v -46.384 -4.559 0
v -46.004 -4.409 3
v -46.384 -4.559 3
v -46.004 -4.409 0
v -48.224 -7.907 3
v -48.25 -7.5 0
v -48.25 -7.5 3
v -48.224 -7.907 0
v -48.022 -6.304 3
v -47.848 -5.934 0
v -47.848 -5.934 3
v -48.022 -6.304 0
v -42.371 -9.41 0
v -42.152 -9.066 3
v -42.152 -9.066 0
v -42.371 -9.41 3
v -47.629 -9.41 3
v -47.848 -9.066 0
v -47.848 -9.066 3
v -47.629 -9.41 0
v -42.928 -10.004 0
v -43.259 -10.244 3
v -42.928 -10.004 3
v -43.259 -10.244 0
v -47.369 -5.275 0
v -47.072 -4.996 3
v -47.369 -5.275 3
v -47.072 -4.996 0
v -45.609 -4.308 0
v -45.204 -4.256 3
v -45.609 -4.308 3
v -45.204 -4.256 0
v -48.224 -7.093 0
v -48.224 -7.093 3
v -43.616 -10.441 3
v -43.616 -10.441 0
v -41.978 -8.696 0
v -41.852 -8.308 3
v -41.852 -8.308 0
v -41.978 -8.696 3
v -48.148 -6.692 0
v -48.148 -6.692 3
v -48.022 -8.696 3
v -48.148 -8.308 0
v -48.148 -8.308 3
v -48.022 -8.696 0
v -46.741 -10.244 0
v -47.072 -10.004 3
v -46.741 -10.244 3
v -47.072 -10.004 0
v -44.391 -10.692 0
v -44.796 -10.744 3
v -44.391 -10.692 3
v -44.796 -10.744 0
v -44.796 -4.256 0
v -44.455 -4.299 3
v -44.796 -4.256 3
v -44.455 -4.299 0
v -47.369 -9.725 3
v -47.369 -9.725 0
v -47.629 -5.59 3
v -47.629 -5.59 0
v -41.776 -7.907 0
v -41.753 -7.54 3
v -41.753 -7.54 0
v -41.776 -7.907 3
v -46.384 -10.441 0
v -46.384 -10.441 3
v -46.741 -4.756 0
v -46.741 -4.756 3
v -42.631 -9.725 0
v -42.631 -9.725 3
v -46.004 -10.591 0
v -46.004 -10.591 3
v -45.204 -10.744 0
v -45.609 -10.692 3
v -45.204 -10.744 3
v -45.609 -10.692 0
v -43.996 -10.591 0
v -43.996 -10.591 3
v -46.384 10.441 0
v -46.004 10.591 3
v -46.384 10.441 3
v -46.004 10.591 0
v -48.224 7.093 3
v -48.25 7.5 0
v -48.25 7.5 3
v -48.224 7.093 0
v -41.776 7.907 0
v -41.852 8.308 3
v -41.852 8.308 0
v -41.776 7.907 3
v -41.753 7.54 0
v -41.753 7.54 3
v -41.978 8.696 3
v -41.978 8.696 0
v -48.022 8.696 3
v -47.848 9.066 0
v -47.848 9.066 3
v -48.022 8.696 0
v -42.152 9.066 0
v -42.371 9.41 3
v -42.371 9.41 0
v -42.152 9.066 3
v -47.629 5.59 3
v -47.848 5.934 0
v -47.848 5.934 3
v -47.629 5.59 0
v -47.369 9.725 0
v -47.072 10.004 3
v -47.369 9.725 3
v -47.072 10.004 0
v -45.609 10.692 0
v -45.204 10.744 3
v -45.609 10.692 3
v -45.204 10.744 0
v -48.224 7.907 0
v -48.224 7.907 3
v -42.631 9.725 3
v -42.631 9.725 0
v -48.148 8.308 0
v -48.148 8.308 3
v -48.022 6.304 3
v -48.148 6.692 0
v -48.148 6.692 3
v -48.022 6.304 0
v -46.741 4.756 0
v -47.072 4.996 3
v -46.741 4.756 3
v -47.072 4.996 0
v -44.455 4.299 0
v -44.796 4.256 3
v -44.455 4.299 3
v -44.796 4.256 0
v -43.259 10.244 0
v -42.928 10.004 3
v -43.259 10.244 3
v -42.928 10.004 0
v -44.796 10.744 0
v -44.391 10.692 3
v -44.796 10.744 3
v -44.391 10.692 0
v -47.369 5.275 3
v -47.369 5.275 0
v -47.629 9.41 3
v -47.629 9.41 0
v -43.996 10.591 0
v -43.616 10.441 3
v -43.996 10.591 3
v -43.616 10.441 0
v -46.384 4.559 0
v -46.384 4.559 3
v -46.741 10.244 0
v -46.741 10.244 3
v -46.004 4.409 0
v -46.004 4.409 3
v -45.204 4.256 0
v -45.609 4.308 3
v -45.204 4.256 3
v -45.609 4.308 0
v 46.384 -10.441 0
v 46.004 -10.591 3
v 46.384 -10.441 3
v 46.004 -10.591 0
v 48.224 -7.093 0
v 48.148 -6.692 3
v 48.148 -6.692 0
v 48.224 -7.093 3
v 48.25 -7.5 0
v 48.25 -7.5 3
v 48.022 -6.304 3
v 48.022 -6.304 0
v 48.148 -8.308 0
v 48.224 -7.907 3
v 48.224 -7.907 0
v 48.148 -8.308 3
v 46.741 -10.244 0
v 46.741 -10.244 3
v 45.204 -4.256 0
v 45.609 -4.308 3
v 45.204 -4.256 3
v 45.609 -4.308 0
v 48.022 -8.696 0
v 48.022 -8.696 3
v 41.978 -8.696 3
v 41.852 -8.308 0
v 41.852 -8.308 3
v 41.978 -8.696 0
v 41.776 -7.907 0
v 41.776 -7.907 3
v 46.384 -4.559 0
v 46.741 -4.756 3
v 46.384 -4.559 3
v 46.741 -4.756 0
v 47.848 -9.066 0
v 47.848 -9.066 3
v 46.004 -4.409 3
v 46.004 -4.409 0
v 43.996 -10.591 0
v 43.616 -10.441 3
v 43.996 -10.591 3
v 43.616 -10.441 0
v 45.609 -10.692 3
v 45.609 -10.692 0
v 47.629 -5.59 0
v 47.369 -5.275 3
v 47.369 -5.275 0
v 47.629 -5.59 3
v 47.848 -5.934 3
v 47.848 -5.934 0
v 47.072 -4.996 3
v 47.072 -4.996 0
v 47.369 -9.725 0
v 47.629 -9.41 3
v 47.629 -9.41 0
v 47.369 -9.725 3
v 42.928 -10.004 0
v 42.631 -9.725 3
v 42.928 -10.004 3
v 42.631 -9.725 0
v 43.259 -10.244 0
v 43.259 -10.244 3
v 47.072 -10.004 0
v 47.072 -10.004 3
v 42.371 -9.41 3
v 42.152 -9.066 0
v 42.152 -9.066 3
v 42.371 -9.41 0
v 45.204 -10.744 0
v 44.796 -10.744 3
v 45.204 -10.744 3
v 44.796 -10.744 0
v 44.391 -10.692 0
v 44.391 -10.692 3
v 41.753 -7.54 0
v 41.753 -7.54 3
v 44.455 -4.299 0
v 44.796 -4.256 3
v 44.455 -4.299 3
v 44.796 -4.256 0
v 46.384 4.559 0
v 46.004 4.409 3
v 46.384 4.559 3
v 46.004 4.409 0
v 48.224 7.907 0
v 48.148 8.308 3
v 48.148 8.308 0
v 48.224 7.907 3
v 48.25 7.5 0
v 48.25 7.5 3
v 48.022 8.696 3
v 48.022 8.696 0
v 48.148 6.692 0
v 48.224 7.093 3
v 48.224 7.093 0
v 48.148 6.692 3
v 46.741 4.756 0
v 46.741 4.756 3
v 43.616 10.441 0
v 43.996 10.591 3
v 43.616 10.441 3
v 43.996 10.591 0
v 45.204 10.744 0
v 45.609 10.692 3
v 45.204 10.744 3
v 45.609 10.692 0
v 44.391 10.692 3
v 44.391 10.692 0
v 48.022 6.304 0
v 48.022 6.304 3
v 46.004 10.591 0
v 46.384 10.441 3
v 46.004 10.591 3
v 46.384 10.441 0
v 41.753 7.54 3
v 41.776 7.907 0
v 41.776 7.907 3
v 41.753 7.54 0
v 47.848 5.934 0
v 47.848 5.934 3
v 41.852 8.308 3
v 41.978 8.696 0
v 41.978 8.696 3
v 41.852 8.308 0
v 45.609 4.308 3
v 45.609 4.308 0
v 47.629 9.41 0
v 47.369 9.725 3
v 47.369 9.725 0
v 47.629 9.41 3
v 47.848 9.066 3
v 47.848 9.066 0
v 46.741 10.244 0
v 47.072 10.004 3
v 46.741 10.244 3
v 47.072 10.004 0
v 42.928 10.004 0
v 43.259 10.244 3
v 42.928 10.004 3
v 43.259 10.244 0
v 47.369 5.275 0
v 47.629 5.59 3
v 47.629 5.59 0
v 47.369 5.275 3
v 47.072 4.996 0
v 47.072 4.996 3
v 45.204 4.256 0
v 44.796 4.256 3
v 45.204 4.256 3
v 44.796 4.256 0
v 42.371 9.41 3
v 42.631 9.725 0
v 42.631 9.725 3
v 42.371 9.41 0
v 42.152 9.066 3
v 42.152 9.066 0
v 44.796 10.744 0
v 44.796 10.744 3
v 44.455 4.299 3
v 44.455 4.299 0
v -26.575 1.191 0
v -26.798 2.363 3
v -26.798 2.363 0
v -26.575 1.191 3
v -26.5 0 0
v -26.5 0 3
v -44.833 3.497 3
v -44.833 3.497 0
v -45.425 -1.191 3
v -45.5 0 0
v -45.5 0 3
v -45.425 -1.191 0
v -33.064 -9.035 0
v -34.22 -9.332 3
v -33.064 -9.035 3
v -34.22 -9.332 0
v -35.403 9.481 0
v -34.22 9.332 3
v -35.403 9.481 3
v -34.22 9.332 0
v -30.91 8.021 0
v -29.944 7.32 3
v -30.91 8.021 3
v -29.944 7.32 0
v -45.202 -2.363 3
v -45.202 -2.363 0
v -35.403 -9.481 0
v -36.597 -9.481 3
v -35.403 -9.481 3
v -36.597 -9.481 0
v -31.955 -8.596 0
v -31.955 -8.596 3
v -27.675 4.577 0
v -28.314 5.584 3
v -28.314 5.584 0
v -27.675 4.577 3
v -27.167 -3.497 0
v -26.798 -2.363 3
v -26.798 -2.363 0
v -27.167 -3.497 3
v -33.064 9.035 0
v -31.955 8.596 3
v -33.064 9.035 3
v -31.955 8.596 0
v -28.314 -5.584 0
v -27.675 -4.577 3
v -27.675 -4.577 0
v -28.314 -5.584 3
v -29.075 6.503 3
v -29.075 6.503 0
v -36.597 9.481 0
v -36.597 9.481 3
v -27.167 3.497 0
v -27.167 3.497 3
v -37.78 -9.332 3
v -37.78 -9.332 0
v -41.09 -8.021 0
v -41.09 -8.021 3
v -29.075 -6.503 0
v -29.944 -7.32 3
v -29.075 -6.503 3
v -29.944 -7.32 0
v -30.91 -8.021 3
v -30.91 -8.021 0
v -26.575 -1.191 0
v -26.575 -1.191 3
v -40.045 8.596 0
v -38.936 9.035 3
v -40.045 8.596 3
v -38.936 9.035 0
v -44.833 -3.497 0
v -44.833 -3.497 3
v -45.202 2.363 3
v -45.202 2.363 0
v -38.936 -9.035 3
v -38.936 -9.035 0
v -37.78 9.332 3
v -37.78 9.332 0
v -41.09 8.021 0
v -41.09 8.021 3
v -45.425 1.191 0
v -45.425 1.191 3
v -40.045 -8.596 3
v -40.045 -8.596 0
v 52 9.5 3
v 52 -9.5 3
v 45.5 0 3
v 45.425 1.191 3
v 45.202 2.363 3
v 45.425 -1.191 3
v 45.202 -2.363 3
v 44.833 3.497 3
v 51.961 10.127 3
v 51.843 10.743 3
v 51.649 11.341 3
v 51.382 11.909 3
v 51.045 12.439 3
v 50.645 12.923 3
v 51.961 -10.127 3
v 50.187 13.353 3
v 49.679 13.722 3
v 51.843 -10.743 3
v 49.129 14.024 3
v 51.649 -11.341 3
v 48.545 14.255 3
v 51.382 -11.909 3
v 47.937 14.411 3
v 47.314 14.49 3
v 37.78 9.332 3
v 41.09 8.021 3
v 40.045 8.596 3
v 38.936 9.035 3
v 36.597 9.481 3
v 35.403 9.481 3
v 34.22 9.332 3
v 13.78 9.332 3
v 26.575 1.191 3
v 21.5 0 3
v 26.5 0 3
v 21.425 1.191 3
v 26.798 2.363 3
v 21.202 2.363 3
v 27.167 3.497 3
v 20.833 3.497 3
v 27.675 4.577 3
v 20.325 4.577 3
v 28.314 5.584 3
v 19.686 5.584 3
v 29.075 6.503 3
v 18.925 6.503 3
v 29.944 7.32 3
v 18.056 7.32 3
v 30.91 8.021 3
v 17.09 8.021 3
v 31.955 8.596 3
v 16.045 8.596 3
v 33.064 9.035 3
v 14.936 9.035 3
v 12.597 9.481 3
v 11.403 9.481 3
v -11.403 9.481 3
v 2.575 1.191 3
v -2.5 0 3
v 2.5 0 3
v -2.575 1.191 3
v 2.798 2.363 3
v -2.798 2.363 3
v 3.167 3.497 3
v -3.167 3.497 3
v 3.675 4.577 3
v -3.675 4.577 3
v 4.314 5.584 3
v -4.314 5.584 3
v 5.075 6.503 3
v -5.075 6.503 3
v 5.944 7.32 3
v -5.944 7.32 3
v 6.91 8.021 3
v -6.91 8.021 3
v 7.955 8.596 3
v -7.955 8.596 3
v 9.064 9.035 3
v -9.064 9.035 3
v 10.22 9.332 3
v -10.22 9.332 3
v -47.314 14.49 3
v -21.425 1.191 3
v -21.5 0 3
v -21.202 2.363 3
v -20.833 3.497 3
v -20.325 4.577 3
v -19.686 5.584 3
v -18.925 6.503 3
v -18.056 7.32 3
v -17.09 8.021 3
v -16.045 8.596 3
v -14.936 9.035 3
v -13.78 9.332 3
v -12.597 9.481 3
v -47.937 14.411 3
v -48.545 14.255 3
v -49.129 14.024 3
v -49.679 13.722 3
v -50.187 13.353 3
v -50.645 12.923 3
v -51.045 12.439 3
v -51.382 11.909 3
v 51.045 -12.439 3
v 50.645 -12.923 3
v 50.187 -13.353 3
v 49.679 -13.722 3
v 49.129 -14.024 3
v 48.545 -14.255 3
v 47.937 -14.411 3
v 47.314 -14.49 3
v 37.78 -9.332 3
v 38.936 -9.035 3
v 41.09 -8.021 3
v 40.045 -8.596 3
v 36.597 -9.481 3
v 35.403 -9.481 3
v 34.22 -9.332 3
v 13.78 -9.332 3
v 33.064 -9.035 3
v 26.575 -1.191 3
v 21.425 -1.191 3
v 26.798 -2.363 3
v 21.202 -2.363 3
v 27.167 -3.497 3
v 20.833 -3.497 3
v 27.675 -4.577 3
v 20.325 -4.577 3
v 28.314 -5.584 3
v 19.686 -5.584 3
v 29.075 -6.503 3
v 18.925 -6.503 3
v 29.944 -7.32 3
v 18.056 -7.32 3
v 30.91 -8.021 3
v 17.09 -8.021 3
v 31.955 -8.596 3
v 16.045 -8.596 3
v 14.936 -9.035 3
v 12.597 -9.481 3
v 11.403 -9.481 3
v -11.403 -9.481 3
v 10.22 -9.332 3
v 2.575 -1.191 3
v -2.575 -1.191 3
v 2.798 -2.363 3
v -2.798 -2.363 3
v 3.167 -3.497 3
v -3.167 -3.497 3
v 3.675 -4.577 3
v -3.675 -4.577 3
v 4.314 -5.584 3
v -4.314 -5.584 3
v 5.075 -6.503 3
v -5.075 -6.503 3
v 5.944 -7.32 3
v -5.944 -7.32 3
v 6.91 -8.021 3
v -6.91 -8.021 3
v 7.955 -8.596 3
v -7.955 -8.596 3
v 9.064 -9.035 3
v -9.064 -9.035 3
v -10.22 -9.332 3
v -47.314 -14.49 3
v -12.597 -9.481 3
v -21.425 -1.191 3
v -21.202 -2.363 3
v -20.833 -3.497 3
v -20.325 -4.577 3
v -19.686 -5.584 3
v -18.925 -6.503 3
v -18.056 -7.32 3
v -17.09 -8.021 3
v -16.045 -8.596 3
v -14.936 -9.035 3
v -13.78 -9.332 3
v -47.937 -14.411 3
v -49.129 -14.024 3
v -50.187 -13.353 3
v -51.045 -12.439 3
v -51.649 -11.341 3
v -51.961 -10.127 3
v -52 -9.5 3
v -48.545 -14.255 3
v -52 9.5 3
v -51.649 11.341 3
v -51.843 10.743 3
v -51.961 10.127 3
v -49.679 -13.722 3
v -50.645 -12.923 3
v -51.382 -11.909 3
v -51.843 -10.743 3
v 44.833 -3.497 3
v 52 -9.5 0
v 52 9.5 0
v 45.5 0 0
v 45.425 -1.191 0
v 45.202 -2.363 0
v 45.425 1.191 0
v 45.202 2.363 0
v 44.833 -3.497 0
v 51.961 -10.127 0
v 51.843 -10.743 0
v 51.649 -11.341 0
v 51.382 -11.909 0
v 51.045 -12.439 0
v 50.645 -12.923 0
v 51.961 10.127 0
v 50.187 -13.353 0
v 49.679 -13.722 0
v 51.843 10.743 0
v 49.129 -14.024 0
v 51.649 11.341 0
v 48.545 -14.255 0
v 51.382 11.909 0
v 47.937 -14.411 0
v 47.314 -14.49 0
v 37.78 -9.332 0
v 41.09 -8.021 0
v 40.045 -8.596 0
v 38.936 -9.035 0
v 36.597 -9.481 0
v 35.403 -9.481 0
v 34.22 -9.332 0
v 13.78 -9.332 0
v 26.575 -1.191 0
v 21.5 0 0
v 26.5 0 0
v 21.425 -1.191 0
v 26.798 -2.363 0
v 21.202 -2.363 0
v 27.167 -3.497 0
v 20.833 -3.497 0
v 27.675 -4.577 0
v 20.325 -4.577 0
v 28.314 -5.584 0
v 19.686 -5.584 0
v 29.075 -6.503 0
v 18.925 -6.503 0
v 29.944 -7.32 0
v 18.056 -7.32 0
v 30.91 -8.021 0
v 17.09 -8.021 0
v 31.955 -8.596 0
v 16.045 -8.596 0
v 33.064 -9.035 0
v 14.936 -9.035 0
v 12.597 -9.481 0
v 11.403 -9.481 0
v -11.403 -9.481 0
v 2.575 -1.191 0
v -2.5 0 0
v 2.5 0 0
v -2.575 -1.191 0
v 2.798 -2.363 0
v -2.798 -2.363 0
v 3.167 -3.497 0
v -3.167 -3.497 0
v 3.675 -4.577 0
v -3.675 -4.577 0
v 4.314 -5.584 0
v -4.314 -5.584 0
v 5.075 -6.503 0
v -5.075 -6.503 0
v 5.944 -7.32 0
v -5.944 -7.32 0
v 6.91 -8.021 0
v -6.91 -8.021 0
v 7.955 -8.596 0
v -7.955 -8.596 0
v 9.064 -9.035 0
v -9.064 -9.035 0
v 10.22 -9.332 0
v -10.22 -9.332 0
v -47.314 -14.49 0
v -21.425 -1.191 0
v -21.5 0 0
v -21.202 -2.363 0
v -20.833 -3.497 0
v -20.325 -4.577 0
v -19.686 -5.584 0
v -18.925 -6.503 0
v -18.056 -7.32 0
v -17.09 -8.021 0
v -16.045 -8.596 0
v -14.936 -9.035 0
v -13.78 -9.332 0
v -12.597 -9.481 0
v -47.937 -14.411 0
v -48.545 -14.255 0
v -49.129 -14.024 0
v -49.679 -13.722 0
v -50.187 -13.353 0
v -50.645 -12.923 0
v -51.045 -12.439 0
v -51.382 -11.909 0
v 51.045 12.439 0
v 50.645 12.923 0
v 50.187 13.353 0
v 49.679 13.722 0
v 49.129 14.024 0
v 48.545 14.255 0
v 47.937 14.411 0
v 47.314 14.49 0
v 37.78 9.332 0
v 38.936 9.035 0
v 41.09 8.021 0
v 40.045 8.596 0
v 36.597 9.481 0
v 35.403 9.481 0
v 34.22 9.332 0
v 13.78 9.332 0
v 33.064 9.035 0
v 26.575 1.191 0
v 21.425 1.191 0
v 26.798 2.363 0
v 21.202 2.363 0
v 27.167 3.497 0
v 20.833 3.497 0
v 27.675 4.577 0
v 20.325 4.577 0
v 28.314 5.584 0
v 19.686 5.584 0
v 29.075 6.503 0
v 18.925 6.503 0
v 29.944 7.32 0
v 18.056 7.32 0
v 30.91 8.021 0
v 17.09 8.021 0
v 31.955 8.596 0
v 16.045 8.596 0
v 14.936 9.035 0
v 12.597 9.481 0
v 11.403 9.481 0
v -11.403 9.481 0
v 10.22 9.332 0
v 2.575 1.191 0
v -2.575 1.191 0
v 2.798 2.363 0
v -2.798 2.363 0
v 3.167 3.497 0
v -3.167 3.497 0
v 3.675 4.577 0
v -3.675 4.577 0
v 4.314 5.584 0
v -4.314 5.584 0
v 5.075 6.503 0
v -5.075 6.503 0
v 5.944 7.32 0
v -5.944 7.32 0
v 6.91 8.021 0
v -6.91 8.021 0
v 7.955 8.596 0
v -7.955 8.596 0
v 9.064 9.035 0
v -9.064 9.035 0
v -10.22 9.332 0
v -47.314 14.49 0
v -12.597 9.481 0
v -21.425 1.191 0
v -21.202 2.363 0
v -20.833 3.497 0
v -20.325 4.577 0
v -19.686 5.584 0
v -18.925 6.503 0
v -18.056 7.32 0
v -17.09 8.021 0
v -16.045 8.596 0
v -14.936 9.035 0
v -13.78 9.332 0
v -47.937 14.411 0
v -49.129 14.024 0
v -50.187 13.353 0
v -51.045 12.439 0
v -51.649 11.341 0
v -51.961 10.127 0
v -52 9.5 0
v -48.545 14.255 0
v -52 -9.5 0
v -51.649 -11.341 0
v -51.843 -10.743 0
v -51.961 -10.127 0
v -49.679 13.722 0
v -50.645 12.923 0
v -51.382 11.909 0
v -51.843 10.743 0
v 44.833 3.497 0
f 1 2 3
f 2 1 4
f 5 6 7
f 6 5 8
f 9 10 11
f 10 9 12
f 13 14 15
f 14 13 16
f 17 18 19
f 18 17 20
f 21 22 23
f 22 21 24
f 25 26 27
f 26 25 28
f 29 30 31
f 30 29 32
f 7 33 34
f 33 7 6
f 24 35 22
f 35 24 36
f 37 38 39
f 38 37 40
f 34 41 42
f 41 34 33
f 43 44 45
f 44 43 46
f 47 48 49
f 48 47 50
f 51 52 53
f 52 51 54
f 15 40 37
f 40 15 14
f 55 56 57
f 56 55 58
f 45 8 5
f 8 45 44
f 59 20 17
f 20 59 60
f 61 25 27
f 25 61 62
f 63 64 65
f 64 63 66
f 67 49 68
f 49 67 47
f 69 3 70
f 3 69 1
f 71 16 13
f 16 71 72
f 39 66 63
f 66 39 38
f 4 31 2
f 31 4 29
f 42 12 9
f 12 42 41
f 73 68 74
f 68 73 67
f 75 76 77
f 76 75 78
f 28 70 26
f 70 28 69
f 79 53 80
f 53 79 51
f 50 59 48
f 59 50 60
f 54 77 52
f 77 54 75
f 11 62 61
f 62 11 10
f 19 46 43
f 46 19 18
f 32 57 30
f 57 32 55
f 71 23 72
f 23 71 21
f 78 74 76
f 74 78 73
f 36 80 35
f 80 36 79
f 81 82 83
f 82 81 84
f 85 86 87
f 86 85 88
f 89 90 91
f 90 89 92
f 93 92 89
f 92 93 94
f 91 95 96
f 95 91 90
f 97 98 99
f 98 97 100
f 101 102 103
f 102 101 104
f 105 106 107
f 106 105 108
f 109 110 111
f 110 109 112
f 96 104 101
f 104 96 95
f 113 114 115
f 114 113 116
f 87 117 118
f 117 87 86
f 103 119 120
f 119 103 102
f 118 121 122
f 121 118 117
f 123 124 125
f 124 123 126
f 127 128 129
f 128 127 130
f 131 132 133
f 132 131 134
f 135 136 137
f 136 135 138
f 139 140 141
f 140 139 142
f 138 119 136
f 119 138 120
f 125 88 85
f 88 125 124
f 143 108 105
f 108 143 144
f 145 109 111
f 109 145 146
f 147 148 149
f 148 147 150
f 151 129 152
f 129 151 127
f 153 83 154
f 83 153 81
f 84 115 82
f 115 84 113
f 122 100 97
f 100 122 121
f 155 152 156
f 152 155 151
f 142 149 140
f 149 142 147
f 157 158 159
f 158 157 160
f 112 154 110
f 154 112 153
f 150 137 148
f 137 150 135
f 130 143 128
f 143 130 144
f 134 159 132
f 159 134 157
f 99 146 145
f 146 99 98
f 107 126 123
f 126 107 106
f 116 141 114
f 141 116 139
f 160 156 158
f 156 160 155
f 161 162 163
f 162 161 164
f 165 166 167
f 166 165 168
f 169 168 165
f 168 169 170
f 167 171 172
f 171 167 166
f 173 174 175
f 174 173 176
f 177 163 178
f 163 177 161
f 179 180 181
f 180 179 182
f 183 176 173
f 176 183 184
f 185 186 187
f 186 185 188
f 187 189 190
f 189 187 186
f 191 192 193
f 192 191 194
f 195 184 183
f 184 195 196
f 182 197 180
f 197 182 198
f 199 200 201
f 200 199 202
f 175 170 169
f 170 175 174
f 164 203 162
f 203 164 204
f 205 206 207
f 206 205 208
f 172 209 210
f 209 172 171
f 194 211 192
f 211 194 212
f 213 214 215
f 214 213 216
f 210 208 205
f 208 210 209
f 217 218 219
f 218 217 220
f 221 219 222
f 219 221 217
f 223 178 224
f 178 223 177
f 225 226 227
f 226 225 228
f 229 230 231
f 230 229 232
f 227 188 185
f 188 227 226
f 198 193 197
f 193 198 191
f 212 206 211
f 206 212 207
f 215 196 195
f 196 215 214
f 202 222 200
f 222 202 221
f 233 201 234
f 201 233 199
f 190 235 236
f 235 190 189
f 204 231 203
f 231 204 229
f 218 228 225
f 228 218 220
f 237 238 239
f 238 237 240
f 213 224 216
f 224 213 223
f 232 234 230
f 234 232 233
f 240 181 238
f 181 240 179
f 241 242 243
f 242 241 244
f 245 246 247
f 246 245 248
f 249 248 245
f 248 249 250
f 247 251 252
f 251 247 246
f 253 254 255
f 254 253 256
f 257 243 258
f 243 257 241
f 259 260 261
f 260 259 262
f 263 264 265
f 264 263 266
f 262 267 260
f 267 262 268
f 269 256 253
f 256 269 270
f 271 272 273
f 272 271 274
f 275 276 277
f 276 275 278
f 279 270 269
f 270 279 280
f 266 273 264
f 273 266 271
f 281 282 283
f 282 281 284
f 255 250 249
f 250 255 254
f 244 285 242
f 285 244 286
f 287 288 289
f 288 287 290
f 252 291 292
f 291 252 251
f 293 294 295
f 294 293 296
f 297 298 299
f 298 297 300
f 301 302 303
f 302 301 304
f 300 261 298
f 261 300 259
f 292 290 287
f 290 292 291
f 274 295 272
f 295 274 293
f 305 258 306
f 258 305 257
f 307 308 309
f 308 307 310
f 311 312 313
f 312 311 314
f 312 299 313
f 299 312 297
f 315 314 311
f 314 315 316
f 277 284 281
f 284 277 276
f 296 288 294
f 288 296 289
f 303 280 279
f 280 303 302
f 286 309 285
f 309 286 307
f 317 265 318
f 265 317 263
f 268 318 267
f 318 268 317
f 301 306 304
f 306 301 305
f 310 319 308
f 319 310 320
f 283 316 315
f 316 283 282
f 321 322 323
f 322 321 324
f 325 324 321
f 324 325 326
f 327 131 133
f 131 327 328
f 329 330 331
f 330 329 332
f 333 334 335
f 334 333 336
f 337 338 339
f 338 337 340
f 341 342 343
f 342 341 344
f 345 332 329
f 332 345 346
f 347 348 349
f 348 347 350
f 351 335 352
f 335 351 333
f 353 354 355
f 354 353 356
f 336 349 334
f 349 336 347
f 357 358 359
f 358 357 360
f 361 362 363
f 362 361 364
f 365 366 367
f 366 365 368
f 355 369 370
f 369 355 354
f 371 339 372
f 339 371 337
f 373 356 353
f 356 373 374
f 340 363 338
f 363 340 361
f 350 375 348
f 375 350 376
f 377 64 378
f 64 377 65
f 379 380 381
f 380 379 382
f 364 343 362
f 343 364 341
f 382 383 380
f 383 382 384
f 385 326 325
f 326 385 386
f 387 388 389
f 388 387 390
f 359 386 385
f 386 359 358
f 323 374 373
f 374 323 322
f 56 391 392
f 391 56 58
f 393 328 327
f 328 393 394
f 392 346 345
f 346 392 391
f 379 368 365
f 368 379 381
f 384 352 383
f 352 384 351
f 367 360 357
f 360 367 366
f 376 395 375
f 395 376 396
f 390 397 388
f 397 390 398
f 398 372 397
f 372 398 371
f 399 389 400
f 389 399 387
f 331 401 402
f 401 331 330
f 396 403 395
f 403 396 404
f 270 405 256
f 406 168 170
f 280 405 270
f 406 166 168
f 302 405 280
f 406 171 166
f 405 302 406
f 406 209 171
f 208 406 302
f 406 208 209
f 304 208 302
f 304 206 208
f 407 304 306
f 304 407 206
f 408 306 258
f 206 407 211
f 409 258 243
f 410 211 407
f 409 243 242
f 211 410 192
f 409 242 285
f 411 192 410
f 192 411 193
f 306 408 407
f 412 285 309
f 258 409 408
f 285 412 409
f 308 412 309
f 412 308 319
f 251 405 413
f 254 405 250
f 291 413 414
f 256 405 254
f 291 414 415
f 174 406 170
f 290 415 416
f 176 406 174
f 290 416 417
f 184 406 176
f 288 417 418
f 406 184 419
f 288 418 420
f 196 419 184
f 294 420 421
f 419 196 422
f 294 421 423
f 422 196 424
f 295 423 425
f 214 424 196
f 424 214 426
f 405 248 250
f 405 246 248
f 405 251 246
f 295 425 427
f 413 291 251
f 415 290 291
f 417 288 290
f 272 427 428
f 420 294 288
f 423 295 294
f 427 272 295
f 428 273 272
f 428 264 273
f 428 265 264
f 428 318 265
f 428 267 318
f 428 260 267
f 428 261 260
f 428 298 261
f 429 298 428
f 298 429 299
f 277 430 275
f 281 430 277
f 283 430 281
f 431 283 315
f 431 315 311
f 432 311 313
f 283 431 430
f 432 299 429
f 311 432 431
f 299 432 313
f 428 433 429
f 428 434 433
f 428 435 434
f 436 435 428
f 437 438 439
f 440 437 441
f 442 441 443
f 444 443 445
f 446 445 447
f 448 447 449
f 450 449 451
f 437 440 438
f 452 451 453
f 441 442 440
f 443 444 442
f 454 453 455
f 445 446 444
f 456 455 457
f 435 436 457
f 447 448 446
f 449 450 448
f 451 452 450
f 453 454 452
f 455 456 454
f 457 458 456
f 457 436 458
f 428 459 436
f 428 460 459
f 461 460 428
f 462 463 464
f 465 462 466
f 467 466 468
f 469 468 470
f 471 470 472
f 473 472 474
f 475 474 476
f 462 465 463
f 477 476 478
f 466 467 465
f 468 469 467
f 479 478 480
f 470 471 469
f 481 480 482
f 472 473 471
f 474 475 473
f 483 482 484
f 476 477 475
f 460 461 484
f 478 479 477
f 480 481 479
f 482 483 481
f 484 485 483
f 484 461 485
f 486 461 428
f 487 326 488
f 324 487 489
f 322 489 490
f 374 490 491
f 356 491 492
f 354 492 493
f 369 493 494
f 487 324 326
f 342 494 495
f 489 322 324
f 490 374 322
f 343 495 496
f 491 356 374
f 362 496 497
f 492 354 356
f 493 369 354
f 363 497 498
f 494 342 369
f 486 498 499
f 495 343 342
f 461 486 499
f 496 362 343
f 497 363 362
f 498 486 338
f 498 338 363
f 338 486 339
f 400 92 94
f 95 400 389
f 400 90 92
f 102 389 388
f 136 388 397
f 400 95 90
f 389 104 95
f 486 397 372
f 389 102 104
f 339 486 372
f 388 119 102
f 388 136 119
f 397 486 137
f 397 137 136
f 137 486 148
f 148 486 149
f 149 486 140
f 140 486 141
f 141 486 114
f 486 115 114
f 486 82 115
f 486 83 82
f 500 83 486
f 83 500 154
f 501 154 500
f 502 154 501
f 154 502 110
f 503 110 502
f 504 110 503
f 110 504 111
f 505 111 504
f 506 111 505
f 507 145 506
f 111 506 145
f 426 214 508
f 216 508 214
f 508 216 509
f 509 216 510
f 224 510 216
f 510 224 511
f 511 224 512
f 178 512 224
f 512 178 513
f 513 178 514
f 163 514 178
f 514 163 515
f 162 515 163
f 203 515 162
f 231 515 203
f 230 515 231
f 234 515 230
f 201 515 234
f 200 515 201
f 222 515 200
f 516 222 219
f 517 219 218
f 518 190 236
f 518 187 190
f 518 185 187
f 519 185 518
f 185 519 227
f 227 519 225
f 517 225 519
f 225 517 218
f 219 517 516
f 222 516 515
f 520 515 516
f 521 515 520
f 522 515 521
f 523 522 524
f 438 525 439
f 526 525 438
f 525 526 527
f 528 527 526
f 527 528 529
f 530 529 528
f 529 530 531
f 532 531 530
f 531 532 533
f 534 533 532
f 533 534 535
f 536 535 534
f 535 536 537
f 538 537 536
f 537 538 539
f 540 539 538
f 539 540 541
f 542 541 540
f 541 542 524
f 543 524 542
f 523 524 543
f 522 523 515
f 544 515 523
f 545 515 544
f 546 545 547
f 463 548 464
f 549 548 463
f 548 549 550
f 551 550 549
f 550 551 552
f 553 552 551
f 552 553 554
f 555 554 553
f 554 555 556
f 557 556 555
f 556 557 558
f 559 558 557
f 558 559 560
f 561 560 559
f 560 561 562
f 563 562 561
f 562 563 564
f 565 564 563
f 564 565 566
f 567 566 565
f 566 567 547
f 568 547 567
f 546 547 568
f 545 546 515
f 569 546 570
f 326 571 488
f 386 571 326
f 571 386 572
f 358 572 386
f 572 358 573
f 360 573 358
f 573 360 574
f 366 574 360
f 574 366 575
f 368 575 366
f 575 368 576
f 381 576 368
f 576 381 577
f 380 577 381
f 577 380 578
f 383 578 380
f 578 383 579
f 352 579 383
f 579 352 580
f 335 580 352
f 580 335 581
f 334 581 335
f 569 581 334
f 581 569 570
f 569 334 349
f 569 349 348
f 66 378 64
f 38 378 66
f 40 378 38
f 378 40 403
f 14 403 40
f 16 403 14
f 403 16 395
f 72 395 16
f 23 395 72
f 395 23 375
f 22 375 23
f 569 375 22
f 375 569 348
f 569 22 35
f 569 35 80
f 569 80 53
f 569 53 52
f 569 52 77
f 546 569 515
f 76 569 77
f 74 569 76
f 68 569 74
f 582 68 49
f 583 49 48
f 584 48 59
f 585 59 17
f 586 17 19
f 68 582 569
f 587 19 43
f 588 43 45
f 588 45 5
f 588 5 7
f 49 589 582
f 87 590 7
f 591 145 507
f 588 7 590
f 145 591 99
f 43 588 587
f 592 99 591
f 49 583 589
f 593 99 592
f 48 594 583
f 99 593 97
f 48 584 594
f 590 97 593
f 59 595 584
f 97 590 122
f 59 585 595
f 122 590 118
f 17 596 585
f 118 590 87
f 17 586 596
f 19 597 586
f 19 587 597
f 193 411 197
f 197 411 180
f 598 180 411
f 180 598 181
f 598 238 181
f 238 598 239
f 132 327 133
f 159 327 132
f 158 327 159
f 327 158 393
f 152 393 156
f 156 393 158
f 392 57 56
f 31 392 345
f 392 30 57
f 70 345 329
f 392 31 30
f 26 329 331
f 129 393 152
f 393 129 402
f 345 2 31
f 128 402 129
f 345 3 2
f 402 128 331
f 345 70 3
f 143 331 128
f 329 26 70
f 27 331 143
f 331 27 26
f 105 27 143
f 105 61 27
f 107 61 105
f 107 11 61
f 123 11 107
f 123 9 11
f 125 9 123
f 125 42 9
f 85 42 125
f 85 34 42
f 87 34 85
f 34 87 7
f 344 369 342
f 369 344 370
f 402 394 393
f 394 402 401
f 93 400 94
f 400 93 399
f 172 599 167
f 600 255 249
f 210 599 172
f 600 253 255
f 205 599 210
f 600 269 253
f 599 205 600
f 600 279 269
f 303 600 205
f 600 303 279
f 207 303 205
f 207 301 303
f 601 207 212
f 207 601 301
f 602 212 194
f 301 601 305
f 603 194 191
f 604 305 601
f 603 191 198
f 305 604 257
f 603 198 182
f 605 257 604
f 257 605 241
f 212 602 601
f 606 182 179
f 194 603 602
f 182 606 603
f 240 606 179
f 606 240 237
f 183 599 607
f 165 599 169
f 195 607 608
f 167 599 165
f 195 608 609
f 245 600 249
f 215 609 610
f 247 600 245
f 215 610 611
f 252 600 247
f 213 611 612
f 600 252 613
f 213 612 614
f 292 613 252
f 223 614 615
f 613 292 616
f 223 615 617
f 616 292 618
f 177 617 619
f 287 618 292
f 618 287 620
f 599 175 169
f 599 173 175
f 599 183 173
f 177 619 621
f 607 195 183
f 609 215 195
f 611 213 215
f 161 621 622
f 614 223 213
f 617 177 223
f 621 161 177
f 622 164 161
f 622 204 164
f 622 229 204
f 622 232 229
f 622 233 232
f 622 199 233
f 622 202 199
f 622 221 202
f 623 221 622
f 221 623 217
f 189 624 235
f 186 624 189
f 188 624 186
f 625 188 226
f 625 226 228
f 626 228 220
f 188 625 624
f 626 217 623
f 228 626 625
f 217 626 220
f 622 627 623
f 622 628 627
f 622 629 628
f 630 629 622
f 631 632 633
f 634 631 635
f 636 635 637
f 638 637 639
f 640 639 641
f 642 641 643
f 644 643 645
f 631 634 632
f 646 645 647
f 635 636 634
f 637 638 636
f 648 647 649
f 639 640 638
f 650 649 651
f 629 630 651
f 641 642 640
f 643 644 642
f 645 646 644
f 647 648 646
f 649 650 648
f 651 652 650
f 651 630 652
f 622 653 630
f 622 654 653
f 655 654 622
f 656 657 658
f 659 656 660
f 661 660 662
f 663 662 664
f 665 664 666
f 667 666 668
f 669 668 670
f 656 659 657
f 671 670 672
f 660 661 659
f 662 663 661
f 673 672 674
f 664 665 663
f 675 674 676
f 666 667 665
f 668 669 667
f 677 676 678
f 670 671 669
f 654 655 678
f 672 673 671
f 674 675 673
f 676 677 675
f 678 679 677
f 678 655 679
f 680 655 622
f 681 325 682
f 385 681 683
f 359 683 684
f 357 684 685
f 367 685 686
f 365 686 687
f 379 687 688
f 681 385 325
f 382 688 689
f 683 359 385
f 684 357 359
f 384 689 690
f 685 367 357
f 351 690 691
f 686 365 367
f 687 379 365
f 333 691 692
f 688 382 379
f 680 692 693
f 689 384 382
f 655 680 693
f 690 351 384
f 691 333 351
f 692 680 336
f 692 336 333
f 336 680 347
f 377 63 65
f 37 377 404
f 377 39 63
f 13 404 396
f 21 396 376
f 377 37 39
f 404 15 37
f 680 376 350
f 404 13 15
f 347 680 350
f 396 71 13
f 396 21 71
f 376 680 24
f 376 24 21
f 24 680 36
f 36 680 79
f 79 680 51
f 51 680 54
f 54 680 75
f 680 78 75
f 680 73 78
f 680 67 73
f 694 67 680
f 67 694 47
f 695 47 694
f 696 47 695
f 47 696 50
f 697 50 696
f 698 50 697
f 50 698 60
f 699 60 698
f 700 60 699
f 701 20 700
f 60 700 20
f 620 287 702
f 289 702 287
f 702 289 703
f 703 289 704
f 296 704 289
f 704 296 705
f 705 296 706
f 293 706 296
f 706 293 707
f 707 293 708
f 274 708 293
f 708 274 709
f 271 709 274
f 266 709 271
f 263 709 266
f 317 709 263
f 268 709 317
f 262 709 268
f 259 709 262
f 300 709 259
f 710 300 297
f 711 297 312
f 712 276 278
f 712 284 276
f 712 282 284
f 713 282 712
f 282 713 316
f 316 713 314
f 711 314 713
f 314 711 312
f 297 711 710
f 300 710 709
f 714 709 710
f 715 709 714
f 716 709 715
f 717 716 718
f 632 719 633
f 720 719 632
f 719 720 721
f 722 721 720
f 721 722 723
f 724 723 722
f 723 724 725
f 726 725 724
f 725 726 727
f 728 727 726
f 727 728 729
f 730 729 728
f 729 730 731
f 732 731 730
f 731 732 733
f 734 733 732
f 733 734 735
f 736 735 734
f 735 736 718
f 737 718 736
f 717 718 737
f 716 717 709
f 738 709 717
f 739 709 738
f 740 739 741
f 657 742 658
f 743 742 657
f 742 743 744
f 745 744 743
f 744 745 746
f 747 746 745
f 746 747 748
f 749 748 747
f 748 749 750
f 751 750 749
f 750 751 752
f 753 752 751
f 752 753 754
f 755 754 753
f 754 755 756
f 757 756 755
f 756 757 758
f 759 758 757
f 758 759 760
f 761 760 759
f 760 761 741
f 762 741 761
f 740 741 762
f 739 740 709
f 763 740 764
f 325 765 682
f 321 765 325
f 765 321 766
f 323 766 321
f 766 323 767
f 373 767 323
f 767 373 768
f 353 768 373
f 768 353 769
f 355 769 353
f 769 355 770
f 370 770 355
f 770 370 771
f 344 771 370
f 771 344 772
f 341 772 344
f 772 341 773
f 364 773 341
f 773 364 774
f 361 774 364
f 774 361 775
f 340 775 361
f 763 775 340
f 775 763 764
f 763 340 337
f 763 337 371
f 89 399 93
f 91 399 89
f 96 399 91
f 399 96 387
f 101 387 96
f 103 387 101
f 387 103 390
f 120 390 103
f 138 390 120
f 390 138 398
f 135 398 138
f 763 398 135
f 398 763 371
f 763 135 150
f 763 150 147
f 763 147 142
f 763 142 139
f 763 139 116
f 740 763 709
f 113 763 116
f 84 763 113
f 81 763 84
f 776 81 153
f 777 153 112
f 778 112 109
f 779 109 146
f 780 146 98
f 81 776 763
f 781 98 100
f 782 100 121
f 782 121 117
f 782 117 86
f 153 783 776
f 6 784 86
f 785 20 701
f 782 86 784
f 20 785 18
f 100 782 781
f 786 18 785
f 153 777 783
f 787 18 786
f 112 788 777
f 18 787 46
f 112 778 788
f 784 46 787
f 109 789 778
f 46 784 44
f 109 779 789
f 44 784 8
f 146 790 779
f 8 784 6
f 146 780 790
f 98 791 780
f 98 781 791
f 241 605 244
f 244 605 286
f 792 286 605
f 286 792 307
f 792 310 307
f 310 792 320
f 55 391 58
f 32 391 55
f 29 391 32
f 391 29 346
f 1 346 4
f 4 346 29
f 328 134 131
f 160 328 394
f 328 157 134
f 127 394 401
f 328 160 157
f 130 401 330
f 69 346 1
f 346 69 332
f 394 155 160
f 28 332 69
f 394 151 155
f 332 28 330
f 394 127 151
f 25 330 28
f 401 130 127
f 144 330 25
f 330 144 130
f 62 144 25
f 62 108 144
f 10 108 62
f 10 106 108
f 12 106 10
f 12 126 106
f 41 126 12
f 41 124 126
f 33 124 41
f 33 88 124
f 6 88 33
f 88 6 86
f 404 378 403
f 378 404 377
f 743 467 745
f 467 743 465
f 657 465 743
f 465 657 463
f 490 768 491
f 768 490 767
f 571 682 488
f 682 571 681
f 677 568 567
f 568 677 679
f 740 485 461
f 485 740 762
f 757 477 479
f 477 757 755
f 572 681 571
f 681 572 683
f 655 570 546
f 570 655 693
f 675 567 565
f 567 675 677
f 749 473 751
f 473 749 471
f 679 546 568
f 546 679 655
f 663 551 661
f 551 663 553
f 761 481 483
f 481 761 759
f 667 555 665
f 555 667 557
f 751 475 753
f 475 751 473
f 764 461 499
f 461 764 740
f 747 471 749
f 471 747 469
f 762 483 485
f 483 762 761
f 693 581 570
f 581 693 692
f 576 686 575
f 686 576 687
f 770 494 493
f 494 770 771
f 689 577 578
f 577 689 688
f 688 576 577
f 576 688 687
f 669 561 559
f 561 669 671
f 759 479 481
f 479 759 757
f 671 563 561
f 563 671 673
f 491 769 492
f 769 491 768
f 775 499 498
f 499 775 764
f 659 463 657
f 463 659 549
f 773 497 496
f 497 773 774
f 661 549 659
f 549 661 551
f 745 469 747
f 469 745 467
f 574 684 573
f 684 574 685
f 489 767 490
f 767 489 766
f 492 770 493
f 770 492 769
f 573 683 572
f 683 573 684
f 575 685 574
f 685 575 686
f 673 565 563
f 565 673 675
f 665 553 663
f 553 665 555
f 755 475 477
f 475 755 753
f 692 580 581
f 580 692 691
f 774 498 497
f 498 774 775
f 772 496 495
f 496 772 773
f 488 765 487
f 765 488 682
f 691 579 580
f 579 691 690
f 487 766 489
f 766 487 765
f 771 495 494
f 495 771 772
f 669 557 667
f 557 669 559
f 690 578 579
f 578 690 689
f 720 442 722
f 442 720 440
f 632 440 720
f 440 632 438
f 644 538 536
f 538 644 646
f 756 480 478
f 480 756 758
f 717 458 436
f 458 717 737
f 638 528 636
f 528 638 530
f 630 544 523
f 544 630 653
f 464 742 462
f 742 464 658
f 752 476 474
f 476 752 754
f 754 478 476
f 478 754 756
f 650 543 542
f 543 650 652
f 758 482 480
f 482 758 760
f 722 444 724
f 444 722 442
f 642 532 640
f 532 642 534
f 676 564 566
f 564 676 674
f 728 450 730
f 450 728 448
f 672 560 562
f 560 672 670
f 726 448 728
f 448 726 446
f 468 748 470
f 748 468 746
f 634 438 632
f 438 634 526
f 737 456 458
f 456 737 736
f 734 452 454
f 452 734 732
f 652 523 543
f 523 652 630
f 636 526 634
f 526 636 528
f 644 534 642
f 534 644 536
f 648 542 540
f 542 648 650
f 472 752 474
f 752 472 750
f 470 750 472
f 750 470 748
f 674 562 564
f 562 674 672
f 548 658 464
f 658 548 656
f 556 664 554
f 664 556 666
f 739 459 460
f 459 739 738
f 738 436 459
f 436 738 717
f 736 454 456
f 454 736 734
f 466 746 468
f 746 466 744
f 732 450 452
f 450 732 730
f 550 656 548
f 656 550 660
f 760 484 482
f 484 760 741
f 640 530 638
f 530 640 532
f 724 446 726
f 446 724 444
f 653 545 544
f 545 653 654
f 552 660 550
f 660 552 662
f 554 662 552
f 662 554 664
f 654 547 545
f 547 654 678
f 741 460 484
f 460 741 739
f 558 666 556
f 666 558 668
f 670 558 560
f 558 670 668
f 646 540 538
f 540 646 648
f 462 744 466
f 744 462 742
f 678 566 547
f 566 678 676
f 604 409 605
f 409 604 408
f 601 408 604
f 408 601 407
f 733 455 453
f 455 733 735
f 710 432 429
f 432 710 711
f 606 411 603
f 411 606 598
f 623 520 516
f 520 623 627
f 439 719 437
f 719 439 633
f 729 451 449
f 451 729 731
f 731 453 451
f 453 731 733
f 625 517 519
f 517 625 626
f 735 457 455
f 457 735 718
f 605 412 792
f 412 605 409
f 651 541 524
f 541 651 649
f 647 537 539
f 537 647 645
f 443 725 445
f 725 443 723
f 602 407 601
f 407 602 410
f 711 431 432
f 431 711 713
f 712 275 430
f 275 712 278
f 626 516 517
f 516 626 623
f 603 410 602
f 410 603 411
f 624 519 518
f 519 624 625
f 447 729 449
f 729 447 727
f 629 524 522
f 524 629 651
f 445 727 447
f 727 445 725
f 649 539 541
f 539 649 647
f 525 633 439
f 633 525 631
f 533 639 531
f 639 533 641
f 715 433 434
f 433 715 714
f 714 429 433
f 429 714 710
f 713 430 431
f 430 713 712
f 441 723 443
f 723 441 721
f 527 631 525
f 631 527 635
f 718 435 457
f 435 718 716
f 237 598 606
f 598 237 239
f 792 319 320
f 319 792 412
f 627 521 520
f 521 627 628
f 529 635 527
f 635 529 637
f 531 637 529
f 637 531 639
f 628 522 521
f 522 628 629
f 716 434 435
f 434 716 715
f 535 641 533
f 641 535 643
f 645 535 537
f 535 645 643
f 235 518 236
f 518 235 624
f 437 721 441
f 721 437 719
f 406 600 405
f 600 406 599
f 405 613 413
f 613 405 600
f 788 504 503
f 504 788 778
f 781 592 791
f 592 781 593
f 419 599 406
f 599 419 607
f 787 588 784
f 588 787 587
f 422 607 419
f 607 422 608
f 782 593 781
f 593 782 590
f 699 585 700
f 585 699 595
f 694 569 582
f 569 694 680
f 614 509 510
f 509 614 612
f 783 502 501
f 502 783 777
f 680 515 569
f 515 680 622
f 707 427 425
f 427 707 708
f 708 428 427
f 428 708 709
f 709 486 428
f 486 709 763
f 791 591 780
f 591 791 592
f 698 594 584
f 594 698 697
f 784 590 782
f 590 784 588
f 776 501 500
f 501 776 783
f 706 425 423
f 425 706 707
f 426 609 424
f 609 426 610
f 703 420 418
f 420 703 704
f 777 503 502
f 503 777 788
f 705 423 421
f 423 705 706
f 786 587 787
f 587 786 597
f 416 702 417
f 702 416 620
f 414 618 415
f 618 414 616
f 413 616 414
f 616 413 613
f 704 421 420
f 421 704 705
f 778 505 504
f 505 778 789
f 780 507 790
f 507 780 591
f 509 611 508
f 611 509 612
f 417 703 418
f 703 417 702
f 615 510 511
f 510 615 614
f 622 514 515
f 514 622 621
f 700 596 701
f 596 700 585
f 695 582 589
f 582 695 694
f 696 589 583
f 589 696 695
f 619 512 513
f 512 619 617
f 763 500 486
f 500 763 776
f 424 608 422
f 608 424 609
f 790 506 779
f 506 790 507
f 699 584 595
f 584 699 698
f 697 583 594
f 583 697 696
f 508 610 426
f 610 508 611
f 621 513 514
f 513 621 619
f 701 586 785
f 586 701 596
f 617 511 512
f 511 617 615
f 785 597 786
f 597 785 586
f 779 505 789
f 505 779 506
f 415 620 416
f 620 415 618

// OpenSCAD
$fn = 50;


difference() {
	union() {
		hull() {
			translate(v = [-47.0000000000, 9.5000000000, 0]) {
				cylinder(h = 3, r = 5);
			}
			translate(v = [47.0000000000, 9.5000000000, 0]) {
				cylinder(h = 3, r = 5);
			}
			translate(v = [-47.0000000000, -9.5000000000, 0]) {
				cylinder(h = 3, r = 5);
			}
			translate(v = [47.0000000000, -9.5000000000, 0]) {
				cylinder(h = 3, r = 5);
			}
		}
	}
	union() {
		#translate(v = [-45.0000000000, -7.5000000000, -100.0000000000]) {
			cylinder(h = 200, r = 3.2500000000);
		}
		#translate(v = [-45.0000000000, 7.5000000000, -100.0000000000]) {
			cylinder(h = 200, r = 3.2500000000);
		}
		#translate(v = [45.0000000000, -7.5000000000, -100.0000000000]) {
			cylinder(h = 200, r = 3.2500000000);
		}
		#translate(v = [45.0000000000, 7.5000000000, -100.0000000000]) {
			cylinder(h = 200, r = 3.2500000000);
		}
		#translate(v = [-36.0000000000, 0, 0]) {
			cylinder(h = 3, r = 9.5000000000);
		}
		#translate(v = [-12.0000000000, 0, 0]) {
			cylinder(h = 3, r = 9.5000000000);
		}
		#translate(v = [12.0000000000, 0, 0]) {
			cylinder(h = 3, r = 9.5000000000);
		}
		#translate(v = [36.0000000000, 0, 0]) {
			cylinder(h = 3, r = 9.5000000000);
		}
	}
}
